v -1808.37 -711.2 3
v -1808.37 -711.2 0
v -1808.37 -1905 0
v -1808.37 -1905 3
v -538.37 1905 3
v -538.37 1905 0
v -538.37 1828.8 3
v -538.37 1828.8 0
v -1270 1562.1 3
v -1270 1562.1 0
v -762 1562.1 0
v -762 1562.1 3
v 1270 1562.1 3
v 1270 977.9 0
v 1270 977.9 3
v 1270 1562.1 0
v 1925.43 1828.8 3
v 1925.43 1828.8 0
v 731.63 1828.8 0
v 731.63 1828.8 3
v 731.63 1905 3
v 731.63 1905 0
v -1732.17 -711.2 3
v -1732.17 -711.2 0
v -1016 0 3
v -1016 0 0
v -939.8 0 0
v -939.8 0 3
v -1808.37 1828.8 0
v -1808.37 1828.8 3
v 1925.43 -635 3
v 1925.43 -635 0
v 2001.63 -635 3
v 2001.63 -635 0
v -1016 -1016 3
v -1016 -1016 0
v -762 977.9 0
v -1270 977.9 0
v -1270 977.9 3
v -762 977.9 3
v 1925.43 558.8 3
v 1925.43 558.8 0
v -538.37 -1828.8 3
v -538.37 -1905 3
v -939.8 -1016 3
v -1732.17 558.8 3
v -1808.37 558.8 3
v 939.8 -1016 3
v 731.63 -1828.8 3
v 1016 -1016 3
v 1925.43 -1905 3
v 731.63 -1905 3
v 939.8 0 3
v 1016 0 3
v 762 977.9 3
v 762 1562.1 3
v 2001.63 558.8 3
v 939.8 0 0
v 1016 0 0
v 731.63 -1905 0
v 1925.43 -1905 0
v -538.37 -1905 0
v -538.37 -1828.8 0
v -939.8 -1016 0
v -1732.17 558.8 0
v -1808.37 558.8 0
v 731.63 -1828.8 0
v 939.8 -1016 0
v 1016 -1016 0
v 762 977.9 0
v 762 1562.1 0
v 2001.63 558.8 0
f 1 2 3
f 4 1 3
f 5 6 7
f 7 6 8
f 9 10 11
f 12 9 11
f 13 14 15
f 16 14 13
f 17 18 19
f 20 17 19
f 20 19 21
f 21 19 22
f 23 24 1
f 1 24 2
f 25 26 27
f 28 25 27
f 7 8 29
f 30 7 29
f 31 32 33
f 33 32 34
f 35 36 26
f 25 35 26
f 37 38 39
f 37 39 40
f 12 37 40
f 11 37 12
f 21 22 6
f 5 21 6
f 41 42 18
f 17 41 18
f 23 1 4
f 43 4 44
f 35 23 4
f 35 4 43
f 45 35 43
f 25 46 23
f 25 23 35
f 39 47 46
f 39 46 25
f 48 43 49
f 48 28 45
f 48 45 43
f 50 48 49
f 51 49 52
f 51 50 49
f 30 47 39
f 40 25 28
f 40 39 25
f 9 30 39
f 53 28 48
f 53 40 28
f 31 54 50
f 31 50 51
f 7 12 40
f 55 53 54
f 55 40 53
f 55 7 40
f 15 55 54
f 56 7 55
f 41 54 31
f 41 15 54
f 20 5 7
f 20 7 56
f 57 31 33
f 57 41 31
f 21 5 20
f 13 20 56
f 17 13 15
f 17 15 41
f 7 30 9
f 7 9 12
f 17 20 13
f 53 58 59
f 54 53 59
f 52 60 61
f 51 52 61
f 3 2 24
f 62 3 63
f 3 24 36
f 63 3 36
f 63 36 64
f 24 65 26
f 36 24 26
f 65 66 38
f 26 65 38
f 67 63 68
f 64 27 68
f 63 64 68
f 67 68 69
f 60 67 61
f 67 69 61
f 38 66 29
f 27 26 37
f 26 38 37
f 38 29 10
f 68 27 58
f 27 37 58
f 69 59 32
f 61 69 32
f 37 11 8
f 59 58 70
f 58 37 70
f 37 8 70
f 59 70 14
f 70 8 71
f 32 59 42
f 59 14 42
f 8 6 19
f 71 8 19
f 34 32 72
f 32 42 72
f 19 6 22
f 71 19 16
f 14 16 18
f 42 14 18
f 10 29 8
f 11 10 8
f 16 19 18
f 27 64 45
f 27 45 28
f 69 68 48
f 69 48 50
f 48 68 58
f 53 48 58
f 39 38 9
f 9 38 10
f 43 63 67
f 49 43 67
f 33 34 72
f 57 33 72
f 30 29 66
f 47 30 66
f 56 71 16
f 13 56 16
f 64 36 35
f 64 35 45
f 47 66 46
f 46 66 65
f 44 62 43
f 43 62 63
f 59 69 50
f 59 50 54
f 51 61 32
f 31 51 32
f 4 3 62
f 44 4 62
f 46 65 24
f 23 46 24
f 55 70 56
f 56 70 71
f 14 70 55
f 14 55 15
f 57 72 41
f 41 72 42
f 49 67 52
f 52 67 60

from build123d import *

# Parameters (mm, degrees)
F0_W     = 76.2
F0_H     = 1016
F0_W_2   = 508
F0_H_2   = 584.2
F1_DEPTH = 3


with BuildPart() as f1:
    # F0 (on Top) → F1 (new body)
    with BuildSketch(Plane.XY):
        Polygon((731.630458, 1828.8), (731.630458, 1905), (-538.369542, 1905), (-538.369542, 1828.8), (-1808.369542, 1828.8), (-1808.369542, 558.8), (-1732.169542, 558.8), (-1732.169542, -711.2), (-1808.369542, -711.2), (-1808.369542, -1905), (-538.369542, -1905), (-538.369542, -1828.8), (731.630458, -1828.8), (731.630458, -1905), (1925.430458, -1905), (1925.430458, -635), (2001.630458, -635), (2001.630458, 558.8), (1925.430458, 558.8), (1925.430458, 1828.8), align=None)
        with Locations((-977.9, -508)):
            Rectangle(F0_W, F0_H, mode=Mode.SUBTRACT)
        with Locations((977.9, -508)):
            Rectangle(F0_W, F0_H, mode=Mode.SUBTRACT)
        with Locations((-1016, 1270)):
            Rectangle(F0_W_2, F0_H_2, mode=Mode.SUBTRACT)
        with Locations((1016, 1270)):
            Rectangle(F0_W_2, F0_H_2, mode=Mode.SUBTRACT)
    extrude(amount=F1_DEPTH)


solid = f1.part
